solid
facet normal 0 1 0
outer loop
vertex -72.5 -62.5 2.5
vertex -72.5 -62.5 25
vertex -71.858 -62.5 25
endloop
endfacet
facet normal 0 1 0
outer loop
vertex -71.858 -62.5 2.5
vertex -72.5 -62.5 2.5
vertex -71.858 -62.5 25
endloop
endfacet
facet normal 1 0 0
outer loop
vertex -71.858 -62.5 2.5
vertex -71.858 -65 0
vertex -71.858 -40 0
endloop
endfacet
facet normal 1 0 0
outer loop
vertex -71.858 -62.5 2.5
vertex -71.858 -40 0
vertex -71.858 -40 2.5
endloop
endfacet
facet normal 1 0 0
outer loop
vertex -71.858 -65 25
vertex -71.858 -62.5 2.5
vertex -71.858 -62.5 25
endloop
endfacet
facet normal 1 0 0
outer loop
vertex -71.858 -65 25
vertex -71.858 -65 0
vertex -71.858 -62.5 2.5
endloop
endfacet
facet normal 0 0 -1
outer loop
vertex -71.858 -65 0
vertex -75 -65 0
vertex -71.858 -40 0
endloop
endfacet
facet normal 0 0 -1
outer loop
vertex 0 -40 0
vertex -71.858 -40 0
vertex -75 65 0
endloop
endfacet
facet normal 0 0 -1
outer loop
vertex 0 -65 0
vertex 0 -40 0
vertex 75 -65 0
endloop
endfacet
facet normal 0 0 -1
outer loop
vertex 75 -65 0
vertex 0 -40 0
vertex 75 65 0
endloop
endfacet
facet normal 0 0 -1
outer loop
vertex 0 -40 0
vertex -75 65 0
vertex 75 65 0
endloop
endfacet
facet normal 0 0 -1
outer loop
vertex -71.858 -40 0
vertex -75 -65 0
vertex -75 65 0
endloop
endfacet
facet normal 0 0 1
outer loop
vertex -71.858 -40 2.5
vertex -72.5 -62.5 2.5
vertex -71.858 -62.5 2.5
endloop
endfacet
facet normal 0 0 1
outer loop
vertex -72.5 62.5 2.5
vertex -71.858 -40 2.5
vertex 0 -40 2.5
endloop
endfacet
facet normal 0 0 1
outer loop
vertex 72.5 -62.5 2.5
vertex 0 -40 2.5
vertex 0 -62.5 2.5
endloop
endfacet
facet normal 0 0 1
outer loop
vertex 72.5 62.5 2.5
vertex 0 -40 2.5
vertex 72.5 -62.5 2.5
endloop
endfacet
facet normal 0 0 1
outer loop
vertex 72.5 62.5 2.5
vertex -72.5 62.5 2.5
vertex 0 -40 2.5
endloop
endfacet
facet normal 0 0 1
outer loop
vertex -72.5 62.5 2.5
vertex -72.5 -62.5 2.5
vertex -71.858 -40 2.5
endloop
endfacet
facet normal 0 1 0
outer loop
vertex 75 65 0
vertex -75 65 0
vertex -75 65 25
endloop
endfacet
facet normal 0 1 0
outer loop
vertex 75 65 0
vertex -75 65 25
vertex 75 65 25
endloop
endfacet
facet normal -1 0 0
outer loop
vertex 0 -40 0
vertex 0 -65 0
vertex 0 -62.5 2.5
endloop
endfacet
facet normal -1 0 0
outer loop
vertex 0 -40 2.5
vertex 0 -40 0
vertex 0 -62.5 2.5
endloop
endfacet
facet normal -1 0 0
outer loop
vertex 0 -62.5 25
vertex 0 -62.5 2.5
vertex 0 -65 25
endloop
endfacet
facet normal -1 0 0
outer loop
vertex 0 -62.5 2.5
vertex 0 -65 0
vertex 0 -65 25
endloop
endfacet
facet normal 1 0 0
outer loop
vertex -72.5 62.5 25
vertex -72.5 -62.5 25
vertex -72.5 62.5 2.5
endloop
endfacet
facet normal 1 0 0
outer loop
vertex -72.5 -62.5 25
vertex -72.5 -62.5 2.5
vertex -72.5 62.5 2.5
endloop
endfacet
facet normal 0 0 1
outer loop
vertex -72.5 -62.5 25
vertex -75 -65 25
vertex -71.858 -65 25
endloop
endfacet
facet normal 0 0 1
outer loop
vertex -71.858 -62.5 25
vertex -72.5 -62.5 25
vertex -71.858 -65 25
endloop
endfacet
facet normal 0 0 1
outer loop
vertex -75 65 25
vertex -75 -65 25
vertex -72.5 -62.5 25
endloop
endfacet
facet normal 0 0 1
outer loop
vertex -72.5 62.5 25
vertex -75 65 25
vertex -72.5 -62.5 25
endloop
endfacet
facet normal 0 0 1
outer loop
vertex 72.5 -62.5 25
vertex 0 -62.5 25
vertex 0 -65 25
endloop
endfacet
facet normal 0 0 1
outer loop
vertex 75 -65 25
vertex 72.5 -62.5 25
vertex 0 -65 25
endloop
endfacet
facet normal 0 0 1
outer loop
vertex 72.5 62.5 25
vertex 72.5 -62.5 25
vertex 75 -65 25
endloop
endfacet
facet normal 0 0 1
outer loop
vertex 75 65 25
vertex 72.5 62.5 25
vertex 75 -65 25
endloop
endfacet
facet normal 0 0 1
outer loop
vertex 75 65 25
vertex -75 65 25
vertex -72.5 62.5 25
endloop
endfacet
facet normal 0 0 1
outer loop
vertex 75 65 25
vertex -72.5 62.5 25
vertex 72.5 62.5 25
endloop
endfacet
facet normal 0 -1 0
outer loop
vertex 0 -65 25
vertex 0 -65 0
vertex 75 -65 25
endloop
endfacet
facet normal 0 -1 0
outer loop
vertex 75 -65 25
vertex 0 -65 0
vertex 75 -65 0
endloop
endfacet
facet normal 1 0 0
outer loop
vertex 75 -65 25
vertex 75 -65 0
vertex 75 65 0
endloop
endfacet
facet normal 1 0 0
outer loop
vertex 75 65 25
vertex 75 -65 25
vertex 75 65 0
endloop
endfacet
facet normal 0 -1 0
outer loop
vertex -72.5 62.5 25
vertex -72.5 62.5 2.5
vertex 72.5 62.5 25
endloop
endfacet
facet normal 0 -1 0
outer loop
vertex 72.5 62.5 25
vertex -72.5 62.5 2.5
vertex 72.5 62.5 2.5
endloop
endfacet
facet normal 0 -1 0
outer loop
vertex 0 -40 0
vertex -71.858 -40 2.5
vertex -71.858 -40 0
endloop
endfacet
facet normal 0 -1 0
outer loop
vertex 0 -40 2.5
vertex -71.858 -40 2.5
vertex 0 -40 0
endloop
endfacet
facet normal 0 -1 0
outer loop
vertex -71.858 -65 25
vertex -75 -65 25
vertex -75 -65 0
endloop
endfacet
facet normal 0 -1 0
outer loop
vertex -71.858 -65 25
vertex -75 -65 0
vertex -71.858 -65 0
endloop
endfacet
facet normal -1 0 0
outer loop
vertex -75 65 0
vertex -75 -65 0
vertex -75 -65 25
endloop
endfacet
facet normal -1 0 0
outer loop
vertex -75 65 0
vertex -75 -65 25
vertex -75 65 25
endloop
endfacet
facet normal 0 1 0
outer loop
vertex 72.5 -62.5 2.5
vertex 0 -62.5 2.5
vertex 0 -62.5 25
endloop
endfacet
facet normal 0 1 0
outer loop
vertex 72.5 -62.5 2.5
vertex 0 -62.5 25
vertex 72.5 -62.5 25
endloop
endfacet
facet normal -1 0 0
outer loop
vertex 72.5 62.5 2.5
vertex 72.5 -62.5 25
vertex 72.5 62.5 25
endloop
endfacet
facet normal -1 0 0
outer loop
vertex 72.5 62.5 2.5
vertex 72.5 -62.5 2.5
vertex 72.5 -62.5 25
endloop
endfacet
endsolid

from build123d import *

# Parameters (mm, degrees)
F0_W     = 150
F0_H     = 130
F1_DEPTH = 25
F2_T     = -2.5
F3_W     = 71.858019
F3_H     = 25
F4_DEPTH = 25


with BuildPart() as f1:
    # F0 (on Top) → F1 (new body)
    with BuildSketch(Plane.XY):
        Rectangle(F0_W, F0_H)
    extrude(amount=F1_DEPTH)

    # F2
    f2_openings = [f1.faces().sort_by_distance(p)[0] for p in [
        (0, 0, 25),
    ]]
    offset(amount=F2_T, openings=f2_openings)

    # F3 (on face) → F4 (cut)
    with BuildSketch(Plane.XZ.offset(65)):
        with Locations((-35.929009, 12.5)):
            Rectangle(F3_W, F3_H)
    extrude(amount=-F4_DEPTH, mode=Mode.SUBTRACT)


solid = f1.part
